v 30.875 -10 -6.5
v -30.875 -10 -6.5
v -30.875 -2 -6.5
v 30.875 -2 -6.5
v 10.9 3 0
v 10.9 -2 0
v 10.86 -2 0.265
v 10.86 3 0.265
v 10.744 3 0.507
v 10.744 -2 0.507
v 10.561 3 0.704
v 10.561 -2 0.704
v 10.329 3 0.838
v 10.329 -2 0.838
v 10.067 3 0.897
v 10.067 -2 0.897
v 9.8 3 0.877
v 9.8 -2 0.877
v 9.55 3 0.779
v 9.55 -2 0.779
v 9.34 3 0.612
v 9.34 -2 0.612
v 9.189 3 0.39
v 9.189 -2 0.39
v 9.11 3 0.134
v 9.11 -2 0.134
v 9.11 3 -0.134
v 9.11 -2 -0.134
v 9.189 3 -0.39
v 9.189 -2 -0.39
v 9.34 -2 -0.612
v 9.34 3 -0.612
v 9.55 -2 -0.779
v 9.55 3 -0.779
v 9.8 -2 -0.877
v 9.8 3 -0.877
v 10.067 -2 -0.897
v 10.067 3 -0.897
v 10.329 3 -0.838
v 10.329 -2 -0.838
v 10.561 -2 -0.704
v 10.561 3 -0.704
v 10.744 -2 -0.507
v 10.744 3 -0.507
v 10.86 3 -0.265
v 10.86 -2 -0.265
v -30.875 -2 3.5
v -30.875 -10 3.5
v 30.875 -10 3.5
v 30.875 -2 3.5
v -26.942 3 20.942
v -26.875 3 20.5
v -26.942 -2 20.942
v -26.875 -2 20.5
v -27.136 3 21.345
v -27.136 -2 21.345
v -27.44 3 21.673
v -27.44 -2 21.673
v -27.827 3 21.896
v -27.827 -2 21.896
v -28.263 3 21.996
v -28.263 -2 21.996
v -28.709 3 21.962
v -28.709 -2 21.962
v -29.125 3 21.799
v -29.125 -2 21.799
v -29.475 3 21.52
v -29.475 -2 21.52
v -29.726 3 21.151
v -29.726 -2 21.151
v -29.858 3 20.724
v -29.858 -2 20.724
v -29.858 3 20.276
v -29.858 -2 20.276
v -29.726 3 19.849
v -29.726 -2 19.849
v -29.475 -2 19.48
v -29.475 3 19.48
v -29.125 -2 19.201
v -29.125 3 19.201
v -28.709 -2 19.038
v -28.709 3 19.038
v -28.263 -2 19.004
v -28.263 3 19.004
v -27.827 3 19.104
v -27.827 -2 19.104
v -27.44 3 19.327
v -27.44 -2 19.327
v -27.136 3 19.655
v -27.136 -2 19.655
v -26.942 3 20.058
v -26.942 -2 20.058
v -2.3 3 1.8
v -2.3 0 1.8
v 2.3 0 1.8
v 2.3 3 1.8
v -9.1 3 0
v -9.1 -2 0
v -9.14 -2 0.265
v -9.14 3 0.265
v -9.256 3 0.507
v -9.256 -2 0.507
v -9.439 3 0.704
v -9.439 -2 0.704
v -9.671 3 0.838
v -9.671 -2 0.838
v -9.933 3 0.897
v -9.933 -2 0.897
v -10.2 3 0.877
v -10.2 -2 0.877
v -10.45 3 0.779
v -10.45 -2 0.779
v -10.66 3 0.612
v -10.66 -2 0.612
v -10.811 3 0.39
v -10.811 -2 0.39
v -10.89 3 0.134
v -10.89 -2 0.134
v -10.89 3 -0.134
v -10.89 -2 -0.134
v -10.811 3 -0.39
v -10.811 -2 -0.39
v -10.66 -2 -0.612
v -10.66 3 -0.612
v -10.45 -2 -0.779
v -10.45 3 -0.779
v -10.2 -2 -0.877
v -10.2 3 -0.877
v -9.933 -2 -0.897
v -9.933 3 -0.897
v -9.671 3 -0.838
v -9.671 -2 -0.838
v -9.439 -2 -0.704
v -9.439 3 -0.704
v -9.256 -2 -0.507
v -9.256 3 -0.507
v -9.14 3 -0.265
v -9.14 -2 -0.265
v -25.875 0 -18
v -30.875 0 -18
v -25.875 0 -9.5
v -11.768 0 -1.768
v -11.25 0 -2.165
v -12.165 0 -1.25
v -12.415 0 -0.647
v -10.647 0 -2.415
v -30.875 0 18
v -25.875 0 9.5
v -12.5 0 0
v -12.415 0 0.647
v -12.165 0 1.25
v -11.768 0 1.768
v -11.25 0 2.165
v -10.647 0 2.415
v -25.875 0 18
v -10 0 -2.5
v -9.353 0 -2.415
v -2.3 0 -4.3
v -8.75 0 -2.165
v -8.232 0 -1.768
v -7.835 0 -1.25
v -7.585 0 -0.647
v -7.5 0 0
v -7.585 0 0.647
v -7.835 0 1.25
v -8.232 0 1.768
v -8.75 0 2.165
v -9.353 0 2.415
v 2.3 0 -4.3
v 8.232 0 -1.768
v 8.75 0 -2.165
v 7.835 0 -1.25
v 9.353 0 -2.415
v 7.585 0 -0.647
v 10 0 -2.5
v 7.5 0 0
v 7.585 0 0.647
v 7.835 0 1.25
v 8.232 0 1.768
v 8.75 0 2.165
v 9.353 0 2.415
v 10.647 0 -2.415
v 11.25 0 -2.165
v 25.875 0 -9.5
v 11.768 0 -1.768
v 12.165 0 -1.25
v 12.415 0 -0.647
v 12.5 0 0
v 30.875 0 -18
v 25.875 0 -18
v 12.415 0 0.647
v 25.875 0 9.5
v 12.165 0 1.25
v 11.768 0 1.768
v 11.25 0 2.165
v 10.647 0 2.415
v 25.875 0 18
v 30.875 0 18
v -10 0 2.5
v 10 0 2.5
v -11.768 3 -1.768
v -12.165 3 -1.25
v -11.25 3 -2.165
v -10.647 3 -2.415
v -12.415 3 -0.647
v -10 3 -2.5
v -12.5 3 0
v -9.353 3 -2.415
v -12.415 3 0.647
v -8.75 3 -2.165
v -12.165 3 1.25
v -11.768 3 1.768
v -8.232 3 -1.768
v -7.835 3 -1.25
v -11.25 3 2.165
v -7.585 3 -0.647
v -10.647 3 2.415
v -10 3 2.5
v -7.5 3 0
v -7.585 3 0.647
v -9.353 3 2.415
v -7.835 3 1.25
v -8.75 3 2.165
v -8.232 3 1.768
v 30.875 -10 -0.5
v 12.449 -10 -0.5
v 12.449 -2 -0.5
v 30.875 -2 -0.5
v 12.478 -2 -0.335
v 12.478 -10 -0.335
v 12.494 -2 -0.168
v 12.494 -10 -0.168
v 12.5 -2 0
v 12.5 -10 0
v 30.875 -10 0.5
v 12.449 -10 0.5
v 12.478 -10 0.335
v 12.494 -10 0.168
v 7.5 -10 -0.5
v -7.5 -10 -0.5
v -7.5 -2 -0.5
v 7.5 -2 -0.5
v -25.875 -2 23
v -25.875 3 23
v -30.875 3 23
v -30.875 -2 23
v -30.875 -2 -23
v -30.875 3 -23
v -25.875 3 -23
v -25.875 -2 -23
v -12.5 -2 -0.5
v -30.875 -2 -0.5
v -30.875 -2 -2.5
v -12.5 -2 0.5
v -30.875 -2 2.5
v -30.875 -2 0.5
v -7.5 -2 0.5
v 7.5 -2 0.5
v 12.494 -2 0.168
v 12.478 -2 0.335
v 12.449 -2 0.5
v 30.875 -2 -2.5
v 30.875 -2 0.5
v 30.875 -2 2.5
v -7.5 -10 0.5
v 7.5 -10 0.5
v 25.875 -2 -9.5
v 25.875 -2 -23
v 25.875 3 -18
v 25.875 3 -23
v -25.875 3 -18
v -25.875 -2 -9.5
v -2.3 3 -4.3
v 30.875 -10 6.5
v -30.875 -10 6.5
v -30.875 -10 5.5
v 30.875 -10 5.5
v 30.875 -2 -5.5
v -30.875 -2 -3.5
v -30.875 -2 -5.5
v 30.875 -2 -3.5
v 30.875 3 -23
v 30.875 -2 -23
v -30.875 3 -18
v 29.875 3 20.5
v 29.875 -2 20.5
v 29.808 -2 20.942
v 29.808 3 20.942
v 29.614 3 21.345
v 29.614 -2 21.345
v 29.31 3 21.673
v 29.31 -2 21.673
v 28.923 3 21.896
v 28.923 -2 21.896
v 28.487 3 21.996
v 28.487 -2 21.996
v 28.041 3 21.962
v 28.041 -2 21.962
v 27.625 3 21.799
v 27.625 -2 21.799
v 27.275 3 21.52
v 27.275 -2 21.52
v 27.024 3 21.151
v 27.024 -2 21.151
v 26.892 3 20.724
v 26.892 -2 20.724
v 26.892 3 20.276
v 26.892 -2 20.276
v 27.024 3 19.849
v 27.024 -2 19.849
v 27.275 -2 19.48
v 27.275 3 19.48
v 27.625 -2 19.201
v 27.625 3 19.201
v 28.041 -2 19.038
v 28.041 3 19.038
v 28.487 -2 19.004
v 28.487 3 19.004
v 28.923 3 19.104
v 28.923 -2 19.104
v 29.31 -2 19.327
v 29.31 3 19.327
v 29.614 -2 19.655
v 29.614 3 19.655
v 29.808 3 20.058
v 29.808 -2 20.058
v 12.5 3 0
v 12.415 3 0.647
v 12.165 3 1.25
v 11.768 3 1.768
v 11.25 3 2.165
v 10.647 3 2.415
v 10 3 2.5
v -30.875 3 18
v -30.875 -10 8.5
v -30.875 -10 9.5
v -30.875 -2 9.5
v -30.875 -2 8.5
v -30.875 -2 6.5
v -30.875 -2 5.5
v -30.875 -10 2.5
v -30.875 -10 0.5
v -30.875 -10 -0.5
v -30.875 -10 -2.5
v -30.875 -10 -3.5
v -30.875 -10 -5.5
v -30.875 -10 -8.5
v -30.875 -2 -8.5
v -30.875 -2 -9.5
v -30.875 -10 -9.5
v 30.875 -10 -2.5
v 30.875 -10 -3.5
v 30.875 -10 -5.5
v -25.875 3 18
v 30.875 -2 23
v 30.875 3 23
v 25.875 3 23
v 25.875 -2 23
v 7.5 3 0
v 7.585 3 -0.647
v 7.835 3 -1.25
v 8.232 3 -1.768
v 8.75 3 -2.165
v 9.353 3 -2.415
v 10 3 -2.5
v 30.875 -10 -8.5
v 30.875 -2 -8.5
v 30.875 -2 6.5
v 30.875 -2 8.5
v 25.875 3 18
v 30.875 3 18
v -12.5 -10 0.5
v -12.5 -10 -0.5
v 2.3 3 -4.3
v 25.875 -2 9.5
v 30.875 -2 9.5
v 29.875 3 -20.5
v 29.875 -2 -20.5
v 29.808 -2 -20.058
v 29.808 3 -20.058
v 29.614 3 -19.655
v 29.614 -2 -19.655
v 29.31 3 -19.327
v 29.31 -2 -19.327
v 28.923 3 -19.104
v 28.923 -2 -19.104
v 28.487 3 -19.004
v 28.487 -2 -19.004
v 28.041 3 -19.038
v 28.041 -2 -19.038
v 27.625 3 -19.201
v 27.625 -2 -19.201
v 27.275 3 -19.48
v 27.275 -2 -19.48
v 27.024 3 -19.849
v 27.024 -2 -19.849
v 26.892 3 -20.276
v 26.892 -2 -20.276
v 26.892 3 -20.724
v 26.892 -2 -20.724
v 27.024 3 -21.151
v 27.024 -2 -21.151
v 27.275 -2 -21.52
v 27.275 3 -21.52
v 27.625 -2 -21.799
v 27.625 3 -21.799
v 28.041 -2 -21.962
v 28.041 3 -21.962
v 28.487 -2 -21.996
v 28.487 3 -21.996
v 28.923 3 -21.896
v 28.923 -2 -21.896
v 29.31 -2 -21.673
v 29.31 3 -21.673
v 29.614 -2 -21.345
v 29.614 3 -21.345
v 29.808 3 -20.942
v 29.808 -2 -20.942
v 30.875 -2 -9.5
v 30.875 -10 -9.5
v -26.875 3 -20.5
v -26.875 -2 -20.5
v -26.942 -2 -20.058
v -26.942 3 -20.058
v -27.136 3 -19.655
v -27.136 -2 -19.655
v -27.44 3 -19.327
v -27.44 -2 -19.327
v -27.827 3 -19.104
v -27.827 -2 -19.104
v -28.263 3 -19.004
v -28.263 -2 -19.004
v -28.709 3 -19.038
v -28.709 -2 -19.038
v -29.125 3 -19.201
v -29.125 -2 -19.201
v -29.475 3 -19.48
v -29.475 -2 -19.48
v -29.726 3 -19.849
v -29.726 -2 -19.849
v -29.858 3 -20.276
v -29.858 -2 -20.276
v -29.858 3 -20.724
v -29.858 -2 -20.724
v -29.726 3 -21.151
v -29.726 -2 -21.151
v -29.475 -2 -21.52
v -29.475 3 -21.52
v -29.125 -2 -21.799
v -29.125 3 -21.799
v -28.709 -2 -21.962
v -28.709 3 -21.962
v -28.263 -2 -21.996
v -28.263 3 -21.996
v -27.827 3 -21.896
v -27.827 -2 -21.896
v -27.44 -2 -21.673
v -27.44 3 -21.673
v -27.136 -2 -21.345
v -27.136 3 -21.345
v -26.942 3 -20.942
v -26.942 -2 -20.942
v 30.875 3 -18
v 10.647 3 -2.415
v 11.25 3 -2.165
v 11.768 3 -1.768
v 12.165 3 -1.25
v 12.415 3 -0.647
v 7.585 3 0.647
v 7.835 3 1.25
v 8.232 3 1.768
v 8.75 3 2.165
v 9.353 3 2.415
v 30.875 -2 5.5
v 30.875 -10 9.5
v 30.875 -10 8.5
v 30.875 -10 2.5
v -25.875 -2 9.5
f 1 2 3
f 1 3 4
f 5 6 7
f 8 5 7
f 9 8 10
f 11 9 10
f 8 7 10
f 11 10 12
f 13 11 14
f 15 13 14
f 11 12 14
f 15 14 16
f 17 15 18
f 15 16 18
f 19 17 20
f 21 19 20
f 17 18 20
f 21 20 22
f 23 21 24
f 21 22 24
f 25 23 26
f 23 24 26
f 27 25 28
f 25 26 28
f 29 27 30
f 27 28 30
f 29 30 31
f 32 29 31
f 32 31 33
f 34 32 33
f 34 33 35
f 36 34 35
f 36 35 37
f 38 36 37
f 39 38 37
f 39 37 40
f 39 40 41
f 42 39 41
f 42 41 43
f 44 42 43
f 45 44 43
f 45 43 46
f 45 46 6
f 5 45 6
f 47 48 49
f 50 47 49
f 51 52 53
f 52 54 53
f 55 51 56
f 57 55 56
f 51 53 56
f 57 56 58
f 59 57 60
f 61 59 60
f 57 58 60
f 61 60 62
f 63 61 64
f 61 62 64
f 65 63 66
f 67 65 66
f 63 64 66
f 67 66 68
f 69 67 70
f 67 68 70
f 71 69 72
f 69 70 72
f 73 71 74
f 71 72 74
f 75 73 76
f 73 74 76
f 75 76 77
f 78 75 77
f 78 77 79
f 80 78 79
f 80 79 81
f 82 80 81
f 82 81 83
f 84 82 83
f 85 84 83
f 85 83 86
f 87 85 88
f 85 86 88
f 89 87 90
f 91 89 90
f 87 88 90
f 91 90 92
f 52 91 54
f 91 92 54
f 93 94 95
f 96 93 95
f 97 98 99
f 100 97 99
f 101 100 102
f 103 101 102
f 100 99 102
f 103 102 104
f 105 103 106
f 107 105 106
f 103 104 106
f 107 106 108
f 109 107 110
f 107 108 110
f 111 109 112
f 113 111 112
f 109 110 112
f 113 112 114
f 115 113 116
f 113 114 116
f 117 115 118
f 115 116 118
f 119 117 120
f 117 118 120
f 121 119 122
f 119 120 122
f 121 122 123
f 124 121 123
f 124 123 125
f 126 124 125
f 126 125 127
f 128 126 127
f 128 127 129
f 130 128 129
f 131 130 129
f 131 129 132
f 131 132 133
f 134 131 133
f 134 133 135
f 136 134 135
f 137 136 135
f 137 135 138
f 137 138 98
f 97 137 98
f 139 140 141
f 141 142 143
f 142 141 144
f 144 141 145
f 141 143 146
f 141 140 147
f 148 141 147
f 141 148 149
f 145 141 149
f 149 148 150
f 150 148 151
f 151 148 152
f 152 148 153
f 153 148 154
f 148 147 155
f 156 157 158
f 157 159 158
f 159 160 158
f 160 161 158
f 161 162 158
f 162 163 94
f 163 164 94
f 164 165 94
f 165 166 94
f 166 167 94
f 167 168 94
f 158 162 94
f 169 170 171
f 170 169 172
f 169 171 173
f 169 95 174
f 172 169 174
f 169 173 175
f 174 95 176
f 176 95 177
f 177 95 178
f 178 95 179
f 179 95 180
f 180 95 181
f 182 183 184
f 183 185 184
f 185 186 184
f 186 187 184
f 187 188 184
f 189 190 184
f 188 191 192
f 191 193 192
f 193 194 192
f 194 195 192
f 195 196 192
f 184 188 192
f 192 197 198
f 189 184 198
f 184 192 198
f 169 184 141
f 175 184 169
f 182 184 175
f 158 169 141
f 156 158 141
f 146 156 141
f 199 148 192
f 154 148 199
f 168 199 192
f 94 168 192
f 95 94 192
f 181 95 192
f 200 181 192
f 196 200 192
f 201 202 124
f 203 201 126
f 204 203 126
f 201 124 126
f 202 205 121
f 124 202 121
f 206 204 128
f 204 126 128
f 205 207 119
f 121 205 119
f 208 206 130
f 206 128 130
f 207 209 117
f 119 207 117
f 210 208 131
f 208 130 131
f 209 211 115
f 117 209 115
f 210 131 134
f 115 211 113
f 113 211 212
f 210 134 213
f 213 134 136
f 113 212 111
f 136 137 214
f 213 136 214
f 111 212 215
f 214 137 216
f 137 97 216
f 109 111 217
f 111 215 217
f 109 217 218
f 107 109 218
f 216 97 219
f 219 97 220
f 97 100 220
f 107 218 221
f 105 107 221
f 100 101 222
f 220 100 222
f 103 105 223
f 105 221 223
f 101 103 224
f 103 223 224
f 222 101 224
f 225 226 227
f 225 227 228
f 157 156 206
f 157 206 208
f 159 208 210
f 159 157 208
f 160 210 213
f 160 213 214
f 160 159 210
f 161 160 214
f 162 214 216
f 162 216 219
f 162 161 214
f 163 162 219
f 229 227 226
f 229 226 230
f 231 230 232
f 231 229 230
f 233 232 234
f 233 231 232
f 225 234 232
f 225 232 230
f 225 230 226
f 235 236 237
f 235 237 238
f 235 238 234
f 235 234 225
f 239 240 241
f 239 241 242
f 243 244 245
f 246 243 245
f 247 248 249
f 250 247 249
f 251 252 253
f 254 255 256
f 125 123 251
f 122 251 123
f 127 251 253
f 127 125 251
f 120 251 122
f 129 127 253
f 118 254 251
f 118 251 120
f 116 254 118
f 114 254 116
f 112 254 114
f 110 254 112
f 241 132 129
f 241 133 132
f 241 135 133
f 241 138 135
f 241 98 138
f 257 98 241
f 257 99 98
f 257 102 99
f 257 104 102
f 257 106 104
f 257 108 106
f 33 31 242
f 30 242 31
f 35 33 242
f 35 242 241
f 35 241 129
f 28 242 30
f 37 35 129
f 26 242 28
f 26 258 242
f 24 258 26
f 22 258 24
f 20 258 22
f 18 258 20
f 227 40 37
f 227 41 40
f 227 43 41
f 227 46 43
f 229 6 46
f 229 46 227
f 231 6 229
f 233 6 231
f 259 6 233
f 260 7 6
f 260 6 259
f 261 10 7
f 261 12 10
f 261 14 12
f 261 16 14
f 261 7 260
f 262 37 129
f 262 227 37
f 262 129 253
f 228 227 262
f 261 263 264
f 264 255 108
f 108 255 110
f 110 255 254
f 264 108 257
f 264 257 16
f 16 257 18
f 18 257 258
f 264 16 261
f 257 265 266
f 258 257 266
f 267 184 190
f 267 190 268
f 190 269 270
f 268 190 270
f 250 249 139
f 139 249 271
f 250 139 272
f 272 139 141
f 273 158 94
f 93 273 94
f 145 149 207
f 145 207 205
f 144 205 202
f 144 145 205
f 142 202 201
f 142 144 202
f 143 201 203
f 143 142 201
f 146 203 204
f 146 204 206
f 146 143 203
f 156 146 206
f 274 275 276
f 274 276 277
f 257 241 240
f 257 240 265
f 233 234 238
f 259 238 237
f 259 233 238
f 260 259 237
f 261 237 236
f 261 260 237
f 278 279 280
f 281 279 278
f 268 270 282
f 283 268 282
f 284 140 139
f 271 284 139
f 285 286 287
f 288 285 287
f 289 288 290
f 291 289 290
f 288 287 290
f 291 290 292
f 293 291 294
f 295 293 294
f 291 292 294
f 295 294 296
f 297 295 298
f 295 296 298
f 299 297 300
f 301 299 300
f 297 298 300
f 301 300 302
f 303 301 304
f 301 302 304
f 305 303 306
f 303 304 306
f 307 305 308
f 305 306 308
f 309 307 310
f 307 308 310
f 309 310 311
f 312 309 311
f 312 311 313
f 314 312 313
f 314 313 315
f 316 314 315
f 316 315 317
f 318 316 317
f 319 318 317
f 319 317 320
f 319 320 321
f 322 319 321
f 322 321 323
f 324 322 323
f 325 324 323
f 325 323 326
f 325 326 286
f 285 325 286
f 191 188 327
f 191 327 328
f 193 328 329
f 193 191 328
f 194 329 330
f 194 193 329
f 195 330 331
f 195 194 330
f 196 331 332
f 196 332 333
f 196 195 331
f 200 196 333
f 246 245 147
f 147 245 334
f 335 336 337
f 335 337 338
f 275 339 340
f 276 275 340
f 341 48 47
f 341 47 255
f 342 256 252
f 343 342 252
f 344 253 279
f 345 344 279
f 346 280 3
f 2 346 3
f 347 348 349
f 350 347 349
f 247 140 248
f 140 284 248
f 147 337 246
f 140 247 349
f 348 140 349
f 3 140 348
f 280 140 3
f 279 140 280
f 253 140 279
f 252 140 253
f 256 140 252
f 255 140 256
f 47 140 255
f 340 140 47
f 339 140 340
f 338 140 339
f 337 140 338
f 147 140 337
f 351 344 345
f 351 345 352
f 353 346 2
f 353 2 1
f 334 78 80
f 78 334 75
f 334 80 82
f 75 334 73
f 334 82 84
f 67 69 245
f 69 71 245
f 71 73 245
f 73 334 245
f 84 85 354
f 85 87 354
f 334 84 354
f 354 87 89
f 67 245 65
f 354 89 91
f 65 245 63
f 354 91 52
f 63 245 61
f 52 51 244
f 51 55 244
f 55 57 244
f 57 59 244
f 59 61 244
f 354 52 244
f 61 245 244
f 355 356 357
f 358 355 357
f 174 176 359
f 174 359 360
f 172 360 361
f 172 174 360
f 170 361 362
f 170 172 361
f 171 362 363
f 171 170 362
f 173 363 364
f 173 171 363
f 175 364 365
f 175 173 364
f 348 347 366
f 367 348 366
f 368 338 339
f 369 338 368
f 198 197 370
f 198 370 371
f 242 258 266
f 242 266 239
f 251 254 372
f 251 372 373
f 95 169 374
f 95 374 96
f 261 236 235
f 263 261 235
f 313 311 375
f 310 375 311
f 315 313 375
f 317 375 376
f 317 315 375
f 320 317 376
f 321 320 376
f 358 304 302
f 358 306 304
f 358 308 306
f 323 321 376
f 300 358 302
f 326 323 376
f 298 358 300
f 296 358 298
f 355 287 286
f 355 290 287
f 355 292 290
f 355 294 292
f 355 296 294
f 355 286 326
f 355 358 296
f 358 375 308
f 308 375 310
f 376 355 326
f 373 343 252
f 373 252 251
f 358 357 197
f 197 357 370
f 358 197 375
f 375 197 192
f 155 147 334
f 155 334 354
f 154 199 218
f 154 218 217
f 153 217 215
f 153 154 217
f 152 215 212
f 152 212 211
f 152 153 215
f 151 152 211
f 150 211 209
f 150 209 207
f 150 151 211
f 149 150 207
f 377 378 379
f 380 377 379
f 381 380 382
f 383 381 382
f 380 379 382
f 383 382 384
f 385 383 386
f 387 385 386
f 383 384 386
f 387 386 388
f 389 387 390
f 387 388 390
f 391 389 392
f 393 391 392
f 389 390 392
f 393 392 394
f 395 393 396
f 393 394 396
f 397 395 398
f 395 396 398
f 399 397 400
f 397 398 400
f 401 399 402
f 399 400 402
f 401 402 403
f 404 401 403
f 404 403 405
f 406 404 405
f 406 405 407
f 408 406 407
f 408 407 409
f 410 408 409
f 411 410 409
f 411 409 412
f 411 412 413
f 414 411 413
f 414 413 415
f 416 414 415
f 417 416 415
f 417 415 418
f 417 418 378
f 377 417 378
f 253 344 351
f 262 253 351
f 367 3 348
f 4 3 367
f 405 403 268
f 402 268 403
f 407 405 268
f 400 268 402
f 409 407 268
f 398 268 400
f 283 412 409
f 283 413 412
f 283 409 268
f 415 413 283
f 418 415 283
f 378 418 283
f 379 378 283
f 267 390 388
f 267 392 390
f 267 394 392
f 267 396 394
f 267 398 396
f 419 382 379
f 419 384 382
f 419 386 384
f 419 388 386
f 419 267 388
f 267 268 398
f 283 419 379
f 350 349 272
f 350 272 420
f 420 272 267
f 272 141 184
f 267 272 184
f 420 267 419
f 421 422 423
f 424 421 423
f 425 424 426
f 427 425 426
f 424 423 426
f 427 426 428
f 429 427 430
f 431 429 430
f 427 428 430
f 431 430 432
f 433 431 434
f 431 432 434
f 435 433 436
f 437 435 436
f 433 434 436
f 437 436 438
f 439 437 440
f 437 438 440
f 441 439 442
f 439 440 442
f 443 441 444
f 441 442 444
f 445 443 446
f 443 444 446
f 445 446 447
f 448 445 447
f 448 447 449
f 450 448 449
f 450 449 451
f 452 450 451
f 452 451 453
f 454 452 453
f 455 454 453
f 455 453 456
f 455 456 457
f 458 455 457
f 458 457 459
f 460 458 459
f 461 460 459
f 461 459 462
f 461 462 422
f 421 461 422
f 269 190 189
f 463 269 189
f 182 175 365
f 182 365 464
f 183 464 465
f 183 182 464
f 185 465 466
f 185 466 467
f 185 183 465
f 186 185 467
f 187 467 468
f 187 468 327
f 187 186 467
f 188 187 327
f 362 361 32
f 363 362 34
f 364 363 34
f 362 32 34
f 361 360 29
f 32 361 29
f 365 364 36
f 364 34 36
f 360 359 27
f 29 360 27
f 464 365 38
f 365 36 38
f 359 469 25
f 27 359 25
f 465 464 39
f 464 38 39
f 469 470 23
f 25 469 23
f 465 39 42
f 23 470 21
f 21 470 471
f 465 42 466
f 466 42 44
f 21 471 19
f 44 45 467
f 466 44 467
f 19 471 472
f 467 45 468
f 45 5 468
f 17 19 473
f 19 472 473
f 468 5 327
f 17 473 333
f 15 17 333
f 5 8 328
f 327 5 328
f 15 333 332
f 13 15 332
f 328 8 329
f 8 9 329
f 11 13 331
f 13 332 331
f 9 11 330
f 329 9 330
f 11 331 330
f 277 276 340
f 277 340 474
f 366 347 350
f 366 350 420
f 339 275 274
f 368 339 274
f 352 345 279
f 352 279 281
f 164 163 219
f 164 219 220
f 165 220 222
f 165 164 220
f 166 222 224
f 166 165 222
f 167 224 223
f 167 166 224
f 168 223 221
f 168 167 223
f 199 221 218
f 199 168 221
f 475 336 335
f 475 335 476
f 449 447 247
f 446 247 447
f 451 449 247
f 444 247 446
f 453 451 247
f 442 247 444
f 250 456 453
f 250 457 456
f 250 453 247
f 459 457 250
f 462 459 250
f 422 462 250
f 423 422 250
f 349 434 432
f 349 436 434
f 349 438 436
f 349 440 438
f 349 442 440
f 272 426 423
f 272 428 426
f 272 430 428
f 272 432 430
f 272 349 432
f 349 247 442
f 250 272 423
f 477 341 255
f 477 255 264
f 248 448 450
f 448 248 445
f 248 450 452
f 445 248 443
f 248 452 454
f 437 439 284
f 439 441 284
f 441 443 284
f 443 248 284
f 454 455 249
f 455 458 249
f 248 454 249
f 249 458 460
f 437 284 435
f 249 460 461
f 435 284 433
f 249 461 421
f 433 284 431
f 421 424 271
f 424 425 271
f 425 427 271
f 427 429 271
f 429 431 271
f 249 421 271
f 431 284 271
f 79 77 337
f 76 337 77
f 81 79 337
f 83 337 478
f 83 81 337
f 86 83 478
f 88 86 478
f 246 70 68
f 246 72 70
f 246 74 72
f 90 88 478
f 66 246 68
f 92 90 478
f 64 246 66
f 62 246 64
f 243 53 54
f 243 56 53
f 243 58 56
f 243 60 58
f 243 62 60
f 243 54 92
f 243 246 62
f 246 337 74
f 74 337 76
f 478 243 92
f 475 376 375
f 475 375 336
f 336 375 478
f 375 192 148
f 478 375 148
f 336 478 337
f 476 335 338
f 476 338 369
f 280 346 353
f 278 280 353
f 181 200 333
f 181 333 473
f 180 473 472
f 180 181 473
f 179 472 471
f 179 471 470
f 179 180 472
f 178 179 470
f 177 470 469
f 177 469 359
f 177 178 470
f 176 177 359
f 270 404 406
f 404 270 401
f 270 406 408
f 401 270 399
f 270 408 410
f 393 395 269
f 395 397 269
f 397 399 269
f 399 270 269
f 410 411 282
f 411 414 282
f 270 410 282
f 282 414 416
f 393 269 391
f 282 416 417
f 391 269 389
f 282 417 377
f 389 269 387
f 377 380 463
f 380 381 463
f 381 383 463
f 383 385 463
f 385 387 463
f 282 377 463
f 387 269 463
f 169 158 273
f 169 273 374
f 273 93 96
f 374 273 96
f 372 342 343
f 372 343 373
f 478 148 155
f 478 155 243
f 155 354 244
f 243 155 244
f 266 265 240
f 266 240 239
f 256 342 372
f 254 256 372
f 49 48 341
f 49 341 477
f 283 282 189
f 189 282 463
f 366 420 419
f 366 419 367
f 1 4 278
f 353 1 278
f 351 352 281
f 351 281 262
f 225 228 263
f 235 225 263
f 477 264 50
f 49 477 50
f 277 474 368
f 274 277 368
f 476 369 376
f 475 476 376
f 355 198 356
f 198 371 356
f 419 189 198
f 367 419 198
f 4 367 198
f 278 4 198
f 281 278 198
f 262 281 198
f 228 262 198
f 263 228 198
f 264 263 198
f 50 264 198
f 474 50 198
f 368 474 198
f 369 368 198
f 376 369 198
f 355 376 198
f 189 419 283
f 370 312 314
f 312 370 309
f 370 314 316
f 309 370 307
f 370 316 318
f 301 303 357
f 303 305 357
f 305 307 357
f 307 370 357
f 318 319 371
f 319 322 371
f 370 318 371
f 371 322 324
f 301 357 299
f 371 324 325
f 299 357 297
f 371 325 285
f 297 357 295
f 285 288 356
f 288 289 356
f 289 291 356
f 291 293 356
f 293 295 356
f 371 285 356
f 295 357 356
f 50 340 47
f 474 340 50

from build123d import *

# Parameters (mm, degrees)
F1_DEPTH = 10
F2_W     = 5
F2_H     = 13.5
F2_W_2   = 61.75
F2_H_2   = 2
F4_DEPTH = 8
F5_W     = 5
F5_H     = 5
F5_R     = 1.5
F5_R_2   = 0.9
F5_W_2   = 4.6
F5_H_2   = 6.1
F7_DEPTH = 5
F8_DEPTH = 8.001
F9_DEPTH = 5.001


# Not quite as in the source:
# - a feature names something its author has since deleted; it is built from what else it names


with BuildPart() as f1:
    # F0 (on Front) → F1 (new body)
    with BuildSketch(Plane.XZ):
        Polygon((-25.875, 23), (-30.875, 23), (-30.875, -23), (-25.875, -23), (-25.875, -9.5), (0, -9.5), (25.875, -9.5), (25.875, -23), (30.875, -23), (30.875, 23), (25.875, 23), (25.875, 9.5), (0, 9.5), (-25.875, 9.5), align=None)
    extrude(amount=F1_DEPTH)

    # F2 (on face) → F4 (cut, through all)
    with BuildSketch(Plane.XZ.offset(10)):
        with Locations((-28.375, 16.25)):
            Rectangle(F2_W, F2_H)
        with Locations((0, 7.5)):
            Rectangle(F2_W_2, F2_H_2)
        with Locations((0, 4.5)):
            Rectangle(F2_W_2, F2_H_2)
        with Locations((0, 1.5)):
            Rectangle(F2_W_2, F2_H_2)
        with Locations((0, -1.5)):
            Rectangle(F2_W_2, F2_H_2)
        with Locations((0, -4.5)):
            Rectangle(F2_W_2, F2_H_2)
        with Locations((0, -7.5)):
            Rectangle(F2_W_2, F2_H_2)
        with Locations((-28.375, -16.25)):
            Rectangle(F2_W, F2_H)
        with Locations((28.375, 16.25)):
            Rectangle(F2_W, F2_H)
        with Locations((28.375, -16.25)):
            Rectangle(F2_W, F2_H)
    extrude(amount=-F4_DEPTH, mode=Mode.SUBTRACT)

    # F5 (on offset) → F7 (join, through all)
    with BuildSketch(Plane.XZ.offset(2)):
        with Locations((-28.375, 20.5)):
            Rectangle(F5_W, F5_H)
        with Locations((-28.375, 20.5)):
            Circle(F5_R, mode=Mode.SUBTRACT)
        with Locations((28.375, 20.5)):
            Rectangle(F5_W, F5_H)
        with Locations((28.375, 20.5)):
            Circle(F5_R, mode=Mode.SUBTRACT)
        with Locations((28.375, -20.5)):
            Rectangle(F5_W, F5_H)
        with Locations((28.375, -20.5)):
            Circle(F5_R, mode=Mode.SUBTRACT)
        with Locations((-28.375, -20.5)):
            Rectangle(F5_W, F5_H)
        with Locations((-28.375, -20.5)):
            Circle(F5_R, mode=Mode.SUBTRACT)
        with BuildLine():
            ThreePointArc((10, 2.5), (8.232233047, 1.767766953), (7.5, 0))
            ThreePointArc((7.5, 0), (8.232233047, -1.767766953), (10, -2.5))
            ThreePointArc((10, -2.5), (11.767766953, -1.767766953), (12.5, 0))
            ThreePointArc((12.5, 0), (11.767766953, 1.767766953), (10, 2.5))
        make_face()
        with Locations((10, 0)):
            Circle(F5_R_2, mode=Mode.SUBTRACT)
        with BuildLine():
            ThreePointArc((-10, -2.5), (-8.232233047, -1.767766953), (-7.5, 0))
            ThreePointArc((-7.5, 0), (-8.232233047, 1.767766953), (-10, 2.5))
            ThreePointArc((-10, 2.5), (-11.767766953, 1.767766953), (-12.5, 0))
            ThreePointArc((-12.5, 0), (-11.767766953, -1.767766953), (-10, -2.5))
        make_face()
        with Locations((-10, 0)):
            Circle(F5_R_2, mode=Mode.SUBTRACT)
        with Locations((0, -1.25)):
            Rectangle(F5_W_2, F5_H_2)
    extrude(amount=-F7_DEPTH)

    # F5 (on offset) → F8 (cut, through all)
    with BuildSketch(Plane.XZ.offset(2)):
        with BuildLine():
            ThreePointArc((-10, 2.5), (-8.232233047, 1.767766953), (-7.5, 0))
            Line((-7.5, 0), (-7.5, 2.5))
            Line((-7.5, 2.5), (-10, 2.5))
        make_face()
        with BuildLine():
            ThreePointArc((-12.5, 0), (-11.767766953, 1.767766953), (-10, 2.5))
            Line((-10, 2.5), (-12.5, 2.5))
            Line((-12.5, 2.5), (-12.5, 0))
        make_face()
        with BuildLine():
            Line((-12.5, -2.5), (-10, -2.5))
            ThreePointArc((-10, -2.5), (-11.767766953, -1.767766953), (-12.5, 0))
            Line((-12.5, 0), (-12.5, -2.5))
        make_face()
        with BuildLine():
            Line((-7.5, -2.5), (-7.5, 0))
            ThreePointArc((-7.5, 0), (-8.232233047, -1.767766953), (-10, -2.5))
            Line((-10, -2.5), (-7.5, -2.5))
        make_face()
        with BuildLine():
            ThreePointArc((-10, -2.5), (-8.232233047, -1.767766953), (-7.5, 0))
            ThreePointArc((-7.5, 0), (-8.232233047, 1.767766953), (-10, 2.5))
            ThreePointArc((-10, 2.5), (-11.767766953, 1.767766953), (-12.5, 0))
            ThreePointArc((-12.5, 0), (-11.767766953, -1.767766953), (-10, -2.5))
        make_face()
        with Locations((-10, 0)):
            Circle(F5_R_2, mode=Mode.SUBTRACT)
        with Locations((-10, 0)):
            Circle(F5_R_2)
        with BuildLine():
            Line((10, 2.5), (7.5, 2.5))
            Line((7.5, 2.5), (7.5, 0))
            ThreePointArc((7.5, 0), (8.232233047, 1.767766953), (10, 2.5))
        make_face()
        with BuildLine():
            ThreePointArc((10, -2.5), (8.232233047, -1.767766953), (7.5, 0))
            Line((7.5, 0), (7.5, -2.5))
            Line((7.5, -2.5), (10, -2.5))
        make_face()
        with BuildLine():
            ThreePointArc((10, 2.5), (8.232233047, 1.767766953), (7.5, 0))
            ThreePointArc((7.5, 0), (8.232233047, -1.767766953), (10, -2.5))
            ThreePointArc((10, -2.5), (11.767766953, -1.767766953), (12.5, 0))
            ThreePointArc((12.5, 0), (11.767766953, 1.767766953), (10, 2.5))
        make_face()
        with Locations((10, 0)):
            Circle(F5_R_2, mode=Mode.SUBTRACT)
        with Locations((10, 0)):
            Circle(F5_R_2)
    extrude(amount=F8_DEPTH, mode=Mode.SUBTRACT)

    # F5 (on offset) → F9 (cut, through all)
    with BuildSketch(Plane.XZ.offset(2)):
        with Locations((28.375, 20.5)):
            Circle(F5_R)
        with Locations((10, 0)):
            Circle(F5_R_2)
        with Locations((-10, 0)):
            Circle(F5_R_2)
        with Locations((28.375, -20.5)):
            Circle(F5_R)
        with Locations((-28.375, -20.5)):
            Circle(F5_R)
        with Locations((-28.375, 20.5)):
            Circle(F5_R)
    extrude(amount=-F9_DEPTH, mode=Mode.SUBTRACT)


solid = f1.part
